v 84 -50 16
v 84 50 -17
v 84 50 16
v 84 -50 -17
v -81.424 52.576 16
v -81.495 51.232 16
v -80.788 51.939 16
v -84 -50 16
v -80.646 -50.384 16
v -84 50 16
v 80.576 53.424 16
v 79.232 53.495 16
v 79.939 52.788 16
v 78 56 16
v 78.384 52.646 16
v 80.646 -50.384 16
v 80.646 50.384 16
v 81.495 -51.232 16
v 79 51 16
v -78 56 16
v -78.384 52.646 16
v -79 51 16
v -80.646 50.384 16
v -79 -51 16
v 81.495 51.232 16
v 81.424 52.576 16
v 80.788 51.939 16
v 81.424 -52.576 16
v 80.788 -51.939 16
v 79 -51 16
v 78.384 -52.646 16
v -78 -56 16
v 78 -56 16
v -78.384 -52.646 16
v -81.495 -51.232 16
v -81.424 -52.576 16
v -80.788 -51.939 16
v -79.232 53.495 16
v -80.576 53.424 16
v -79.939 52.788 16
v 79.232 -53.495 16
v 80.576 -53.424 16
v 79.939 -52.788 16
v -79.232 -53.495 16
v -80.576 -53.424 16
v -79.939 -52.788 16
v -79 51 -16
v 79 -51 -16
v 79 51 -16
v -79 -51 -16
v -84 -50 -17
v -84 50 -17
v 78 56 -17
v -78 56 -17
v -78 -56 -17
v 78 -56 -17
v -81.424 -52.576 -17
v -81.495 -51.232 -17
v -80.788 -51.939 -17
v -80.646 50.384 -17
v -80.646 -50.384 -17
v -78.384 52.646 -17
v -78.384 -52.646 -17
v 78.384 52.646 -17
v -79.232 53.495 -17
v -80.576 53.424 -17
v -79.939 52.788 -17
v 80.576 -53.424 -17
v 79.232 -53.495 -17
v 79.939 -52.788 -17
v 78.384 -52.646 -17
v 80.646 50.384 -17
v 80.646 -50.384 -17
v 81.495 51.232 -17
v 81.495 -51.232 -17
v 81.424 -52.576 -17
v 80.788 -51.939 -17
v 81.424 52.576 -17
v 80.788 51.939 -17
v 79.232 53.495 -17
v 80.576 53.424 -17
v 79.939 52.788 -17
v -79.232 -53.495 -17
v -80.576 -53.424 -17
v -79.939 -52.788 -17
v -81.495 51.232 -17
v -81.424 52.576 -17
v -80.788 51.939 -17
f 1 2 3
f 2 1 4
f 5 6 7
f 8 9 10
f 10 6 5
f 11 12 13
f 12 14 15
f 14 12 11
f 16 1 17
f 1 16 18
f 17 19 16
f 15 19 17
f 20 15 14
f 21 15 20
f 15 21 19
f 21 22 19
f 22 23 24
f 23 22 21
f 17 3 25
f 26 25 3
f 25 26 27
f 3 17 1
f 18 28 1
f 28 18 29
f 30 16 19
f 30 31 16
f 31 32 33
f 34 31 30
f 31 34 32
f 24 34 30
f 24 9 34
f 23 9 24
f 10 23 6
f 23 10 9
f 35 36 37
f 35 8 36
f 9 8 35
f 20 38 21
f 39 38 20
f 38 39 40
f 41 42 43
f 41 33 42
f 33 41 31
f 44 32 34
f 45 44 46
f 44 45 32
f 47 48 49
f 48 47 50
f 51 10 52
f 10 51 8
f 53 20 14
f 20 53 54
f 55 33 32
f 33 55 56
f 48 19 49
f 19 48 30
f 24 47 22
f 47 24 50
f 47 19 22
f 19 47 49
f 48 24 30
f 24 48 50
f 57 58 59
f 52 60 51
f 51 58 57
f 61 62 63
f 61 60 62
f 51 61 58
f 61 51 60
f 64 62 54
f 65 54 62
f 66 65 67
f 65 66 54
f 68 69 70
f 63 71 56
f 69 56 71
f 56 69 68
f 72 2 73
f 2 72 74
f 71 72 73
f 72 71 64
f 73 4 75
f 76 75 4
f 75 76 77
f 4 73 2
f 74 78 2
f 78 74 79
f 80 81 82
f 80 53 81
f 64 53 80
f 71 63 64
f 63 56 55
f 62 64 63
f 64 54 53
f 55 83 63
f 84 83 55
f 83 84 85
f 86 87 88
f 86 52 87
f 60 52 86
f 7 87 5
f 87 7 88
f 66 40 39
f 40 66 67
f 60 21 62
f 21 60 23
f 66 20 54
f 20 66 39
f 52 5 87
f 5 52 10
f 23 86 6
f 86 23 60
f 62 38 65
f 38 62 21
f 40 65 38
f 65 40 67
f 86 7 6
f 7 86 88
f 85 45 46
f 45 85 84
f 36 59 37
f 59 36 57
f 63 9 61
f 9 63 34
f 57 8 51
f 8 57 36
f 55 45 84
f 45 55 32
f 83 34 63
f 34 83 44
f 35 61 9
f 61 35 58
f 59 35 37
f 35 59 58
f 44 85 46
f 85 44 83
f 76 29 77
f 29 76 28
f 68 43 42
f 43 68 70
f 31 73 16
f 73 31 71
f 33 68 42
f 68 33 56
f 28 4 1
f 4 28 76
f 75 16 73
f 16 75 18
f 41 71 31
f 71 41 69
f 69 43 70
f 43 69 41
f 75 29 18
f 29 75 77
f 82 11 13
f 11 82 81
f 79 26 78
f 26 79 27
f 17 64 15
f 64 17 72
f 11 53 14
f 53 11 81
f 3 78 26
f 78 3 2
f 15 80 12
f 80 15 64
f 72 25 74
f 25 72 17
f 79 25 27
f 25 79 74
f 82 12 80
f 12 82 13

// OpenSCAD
dimension_mode = "grid"; // "grid" (28mm OpenGrid units) or "custom" (explicit mm)
grid_width = 6;
grid_height = 4;
custom_width = 168;
custom_height = 112;

width = (dimension_mode == "custom") ? custom_width : (grid_width * 28);
height = (dimension_mode == "custom") ? custom_height : (grid_height * 28);
depth = 32;
wall_thickness = 5;
back_thickness = 1;
connector_offset = 0.1;

// Horizontal Dividers
h_divider_count = 0;
h_divider_position_mode = "auto";
h_divider_thickness = 3;
h_divider_1_pos = 0;
h_divider_1_depth = 32;
h_divider_2_pos = 0;
h_divider_2_depth = 32;
h_divider_3_pos = 0;
h_divider_3_depth = 32;
h_divider_4_pos = 0;
h_divider_4_depth = 32;
h_divider_5_pos = 0;
h_divider_5_depth = 32;

// Vertical Dividers
v_divider_count = 0;
v_divider_position_mode = "auto";
v_divider_thickness = 3;
v_divider_1_pos = 0;
v_divider_1_depth = 32;
v_divider_2_pos = 0;
v_divider_2_depth = 32;
v_divider_3_pos = 0;
v_divider_3_depth = 32;
v_divider_4_pos = 0;
v_divider_4_depth = 32;
v_divider_5_pos = 0;
v_divider_5_depth = 32;

module connector_cutoff() {
    union() {
        translate([-0.5 - connector_offset, 0, 0 - back_thickness - (depth / 2)])
            cube([1 + (connector_offset * 2), 2 + connector_offset, depth + back_thickness]);
        translate([-1.5 - connector_offset, 1 - connector_offset, 0 - back_thickness - (depth / 2)])
            cube([3 + (connector_offset * 2), 1 + (connector_offset * 2), depth + back_thickness]);
    }
}

function get_custom_h_divider_pos(idx, inner_h) =
    (idx == 1) ? min(max(0, h_divider_1_pos), inner_h) :
    (idx == 2) ? min(max(0, h_divider_2_pos), inner_h) :
    (idx == 3) ? min(max(0, h_divider_3_pos), inner_h) :
    (idx == 4) ? min(max(0, h_divider_4_pos), inner_h) :
    (idx == 5) ? min(max(0, h_divider_5_pos), inner_h) :
    (inner_h / 2);

function get_custom_v_divider_pos(idx, inner_w) =
    (idx == 1) ? min(max(0, v_divider_1_pos), inner_w) :
    (idx == 2) ? min(max(0, v_divider_2_pos), inner_w) :
    (idx == 3) ? min(max(0, v_divider_3_pos), inner_w) :
    (idx == 4) ? min(max(0, v_divider_4_pos), inner_w) :
    (idx == 5) ? min(max(0, v_divider_5_pos), inner_w) :
    (inner_w / 2);

function is_h_custom() = (h_divider_position_mode == "custom");

function is_v_custom() = (v_divider_position_mode == "custom");

function get_h_divider_pos(idx, count, inner_h) =
    is_h_custom()
        ? get_custom_h_divider_pos(idx, inner_h)
        : (idx * inner_h / (count + 1));

function get_v_divider_pos(idx, count, inner_w) =
    is_v_custom()
        ? get_custom_v_divider_pos(idx, inner_w)
        : (idx * inner_w / (count + 1));

function get_h_divider_depth(idx) =
    min(depth,
        (idx == 1 && h_divider_1_depth > 0) ? h_divider_1_depth :
        (idx == 2 && h_divider_2_depth > 0) ? h_divider_2_depth :
        (idx == 3 && h_divider_3_depth > 0) ? h_divider_3_depth :
        (idx == 4 && h_divider_4_depth > 0) ? h_divider_4_depth :
        (idx == 5 && h_divider_5_depth > 0) ? h_divider_5_depth :
        depth
    );

function get_v_divider_depth(idx) =
    min(depth,
        (idx == 1 && v_divider_1_depth > 0) ? v_divider_1_depth :
        (idx == 2 && v_divider_2_depth > 0) ? v_divider_2_depth :
        (idx == 3 && v_divider_3_depth > 0) ? v_divider_3_depth :
        (idx == 4 && v_divider_4_depth > 0) ? v_divider_4_depth :
        (idx == 5 && v_divider_5_depth > 0) ? v_divider_5_depth :
        depth
    );

module horizontal_dividers() {
    inner_w = width - (wall_thickness * 2);
    inner_h = height - (wall_thickness * 2);
    
    if (h_divider_count > 0) {
        for (i = [1 : h_divider_count]) {
            pos_y = get_h_divider_pos(i, h_divider_count, inner_h);
            actual_depth = get_h_divider_depth(i);
            y_coord = (-inner_h / 2) + pos_y;
            z_coord = (-depth / 2) + (actual_depth / 2);
            
            translate([0, y_coord, z_coord])
                cube([inner_w + 0.2, h_divider_thickness, actual_depth], true);
        }
    }
}

module vertical_dividers() {
    inner_w = width - (wall_thickness * 2);
    inner_h = height - (wall_thickness * 2);
    
    if (v_divider_count > 0) {
        for (i = [1 : v_divider_count]) {
            pos_x = get_v_divider_pos(i, v_divider_count, inner_w);
            actual_depth = get_v_divider_depth(i);
            x_coord = (-inner_w / 2) + pos_x;
            z_coord = (-depth / 2) + (actual_depth / 2);
            
            translate([x_coord, 0, z_coord])
                cube([v_divider_thickness, inner_h + 0.2, actual_depth], true);
        }
    }
}

difference() {
    union() {
        // Shell
        difference() {
            cube([width, height, depth], true);
            cube([width - (wall_thickness * 2), height - (wall_thickness * 2), depth], true);
        }

        // Back Wall
        translate([0, 0, 0 - (back_thickness / 2) - (depth / 2)])
            cube([width, height, back_thickness], true);

        // Internal Dividers
        horizontal_dividers();
        vertical_dividers();
    }
    
    // Corners
    translate([0 - (width / 2), 0 - (height / 2), 0 - back_thickness - (depth / 2)])
    linear_extrude(depth + back_thickness) {
        polygon(points = [[0,0], [6,0], [0,6]]);
    }
    
    translate([0 + (width / 2), 0 - (height / 2), 0 - back_thickness - (depth / 2)])
    linear_extrude(depth + back_thickness) {
        polygon(points = [[0,0], [-6,0], [0,6]]);
    }
    
    translate([0 + (width / 2), 0 + (height / 2), 0 - back_thickness - (depth / 2)])
    linear_extrude(depth + back_thickness) {
        polygon(points = [[0,0], [-6,0], [0,-6]]);
    }
    
    translate([0 - (width / 2), 0 + (height / 2), 0 - back_thickness - (depth / 2)])
    linear_extrude(depth + back_thickness) {
        polygon(points = [[0,0], [6,0], [0,-6]]);
    }
    
    translate([(-width / 2) + 3, (height / 2) - 3, 0])
    rotate([0, 0, -135])
        connector_cutoff();
        
    translate([(-width / 2) + 3, (-height / 2) + 3, 0])
    rotate([0, 0, -45])
        connector_cutoff();
    
    translate([(width / 2) - 3, (-height / 2) + 3, 0])
    rotate([0, 0, 45])
        connector_cutoff();
    
    translate([(width / 2) - 3, (height / 2) - 3, 0])
    rotate([0, 0, 135])
        connector_cutoff();
}
